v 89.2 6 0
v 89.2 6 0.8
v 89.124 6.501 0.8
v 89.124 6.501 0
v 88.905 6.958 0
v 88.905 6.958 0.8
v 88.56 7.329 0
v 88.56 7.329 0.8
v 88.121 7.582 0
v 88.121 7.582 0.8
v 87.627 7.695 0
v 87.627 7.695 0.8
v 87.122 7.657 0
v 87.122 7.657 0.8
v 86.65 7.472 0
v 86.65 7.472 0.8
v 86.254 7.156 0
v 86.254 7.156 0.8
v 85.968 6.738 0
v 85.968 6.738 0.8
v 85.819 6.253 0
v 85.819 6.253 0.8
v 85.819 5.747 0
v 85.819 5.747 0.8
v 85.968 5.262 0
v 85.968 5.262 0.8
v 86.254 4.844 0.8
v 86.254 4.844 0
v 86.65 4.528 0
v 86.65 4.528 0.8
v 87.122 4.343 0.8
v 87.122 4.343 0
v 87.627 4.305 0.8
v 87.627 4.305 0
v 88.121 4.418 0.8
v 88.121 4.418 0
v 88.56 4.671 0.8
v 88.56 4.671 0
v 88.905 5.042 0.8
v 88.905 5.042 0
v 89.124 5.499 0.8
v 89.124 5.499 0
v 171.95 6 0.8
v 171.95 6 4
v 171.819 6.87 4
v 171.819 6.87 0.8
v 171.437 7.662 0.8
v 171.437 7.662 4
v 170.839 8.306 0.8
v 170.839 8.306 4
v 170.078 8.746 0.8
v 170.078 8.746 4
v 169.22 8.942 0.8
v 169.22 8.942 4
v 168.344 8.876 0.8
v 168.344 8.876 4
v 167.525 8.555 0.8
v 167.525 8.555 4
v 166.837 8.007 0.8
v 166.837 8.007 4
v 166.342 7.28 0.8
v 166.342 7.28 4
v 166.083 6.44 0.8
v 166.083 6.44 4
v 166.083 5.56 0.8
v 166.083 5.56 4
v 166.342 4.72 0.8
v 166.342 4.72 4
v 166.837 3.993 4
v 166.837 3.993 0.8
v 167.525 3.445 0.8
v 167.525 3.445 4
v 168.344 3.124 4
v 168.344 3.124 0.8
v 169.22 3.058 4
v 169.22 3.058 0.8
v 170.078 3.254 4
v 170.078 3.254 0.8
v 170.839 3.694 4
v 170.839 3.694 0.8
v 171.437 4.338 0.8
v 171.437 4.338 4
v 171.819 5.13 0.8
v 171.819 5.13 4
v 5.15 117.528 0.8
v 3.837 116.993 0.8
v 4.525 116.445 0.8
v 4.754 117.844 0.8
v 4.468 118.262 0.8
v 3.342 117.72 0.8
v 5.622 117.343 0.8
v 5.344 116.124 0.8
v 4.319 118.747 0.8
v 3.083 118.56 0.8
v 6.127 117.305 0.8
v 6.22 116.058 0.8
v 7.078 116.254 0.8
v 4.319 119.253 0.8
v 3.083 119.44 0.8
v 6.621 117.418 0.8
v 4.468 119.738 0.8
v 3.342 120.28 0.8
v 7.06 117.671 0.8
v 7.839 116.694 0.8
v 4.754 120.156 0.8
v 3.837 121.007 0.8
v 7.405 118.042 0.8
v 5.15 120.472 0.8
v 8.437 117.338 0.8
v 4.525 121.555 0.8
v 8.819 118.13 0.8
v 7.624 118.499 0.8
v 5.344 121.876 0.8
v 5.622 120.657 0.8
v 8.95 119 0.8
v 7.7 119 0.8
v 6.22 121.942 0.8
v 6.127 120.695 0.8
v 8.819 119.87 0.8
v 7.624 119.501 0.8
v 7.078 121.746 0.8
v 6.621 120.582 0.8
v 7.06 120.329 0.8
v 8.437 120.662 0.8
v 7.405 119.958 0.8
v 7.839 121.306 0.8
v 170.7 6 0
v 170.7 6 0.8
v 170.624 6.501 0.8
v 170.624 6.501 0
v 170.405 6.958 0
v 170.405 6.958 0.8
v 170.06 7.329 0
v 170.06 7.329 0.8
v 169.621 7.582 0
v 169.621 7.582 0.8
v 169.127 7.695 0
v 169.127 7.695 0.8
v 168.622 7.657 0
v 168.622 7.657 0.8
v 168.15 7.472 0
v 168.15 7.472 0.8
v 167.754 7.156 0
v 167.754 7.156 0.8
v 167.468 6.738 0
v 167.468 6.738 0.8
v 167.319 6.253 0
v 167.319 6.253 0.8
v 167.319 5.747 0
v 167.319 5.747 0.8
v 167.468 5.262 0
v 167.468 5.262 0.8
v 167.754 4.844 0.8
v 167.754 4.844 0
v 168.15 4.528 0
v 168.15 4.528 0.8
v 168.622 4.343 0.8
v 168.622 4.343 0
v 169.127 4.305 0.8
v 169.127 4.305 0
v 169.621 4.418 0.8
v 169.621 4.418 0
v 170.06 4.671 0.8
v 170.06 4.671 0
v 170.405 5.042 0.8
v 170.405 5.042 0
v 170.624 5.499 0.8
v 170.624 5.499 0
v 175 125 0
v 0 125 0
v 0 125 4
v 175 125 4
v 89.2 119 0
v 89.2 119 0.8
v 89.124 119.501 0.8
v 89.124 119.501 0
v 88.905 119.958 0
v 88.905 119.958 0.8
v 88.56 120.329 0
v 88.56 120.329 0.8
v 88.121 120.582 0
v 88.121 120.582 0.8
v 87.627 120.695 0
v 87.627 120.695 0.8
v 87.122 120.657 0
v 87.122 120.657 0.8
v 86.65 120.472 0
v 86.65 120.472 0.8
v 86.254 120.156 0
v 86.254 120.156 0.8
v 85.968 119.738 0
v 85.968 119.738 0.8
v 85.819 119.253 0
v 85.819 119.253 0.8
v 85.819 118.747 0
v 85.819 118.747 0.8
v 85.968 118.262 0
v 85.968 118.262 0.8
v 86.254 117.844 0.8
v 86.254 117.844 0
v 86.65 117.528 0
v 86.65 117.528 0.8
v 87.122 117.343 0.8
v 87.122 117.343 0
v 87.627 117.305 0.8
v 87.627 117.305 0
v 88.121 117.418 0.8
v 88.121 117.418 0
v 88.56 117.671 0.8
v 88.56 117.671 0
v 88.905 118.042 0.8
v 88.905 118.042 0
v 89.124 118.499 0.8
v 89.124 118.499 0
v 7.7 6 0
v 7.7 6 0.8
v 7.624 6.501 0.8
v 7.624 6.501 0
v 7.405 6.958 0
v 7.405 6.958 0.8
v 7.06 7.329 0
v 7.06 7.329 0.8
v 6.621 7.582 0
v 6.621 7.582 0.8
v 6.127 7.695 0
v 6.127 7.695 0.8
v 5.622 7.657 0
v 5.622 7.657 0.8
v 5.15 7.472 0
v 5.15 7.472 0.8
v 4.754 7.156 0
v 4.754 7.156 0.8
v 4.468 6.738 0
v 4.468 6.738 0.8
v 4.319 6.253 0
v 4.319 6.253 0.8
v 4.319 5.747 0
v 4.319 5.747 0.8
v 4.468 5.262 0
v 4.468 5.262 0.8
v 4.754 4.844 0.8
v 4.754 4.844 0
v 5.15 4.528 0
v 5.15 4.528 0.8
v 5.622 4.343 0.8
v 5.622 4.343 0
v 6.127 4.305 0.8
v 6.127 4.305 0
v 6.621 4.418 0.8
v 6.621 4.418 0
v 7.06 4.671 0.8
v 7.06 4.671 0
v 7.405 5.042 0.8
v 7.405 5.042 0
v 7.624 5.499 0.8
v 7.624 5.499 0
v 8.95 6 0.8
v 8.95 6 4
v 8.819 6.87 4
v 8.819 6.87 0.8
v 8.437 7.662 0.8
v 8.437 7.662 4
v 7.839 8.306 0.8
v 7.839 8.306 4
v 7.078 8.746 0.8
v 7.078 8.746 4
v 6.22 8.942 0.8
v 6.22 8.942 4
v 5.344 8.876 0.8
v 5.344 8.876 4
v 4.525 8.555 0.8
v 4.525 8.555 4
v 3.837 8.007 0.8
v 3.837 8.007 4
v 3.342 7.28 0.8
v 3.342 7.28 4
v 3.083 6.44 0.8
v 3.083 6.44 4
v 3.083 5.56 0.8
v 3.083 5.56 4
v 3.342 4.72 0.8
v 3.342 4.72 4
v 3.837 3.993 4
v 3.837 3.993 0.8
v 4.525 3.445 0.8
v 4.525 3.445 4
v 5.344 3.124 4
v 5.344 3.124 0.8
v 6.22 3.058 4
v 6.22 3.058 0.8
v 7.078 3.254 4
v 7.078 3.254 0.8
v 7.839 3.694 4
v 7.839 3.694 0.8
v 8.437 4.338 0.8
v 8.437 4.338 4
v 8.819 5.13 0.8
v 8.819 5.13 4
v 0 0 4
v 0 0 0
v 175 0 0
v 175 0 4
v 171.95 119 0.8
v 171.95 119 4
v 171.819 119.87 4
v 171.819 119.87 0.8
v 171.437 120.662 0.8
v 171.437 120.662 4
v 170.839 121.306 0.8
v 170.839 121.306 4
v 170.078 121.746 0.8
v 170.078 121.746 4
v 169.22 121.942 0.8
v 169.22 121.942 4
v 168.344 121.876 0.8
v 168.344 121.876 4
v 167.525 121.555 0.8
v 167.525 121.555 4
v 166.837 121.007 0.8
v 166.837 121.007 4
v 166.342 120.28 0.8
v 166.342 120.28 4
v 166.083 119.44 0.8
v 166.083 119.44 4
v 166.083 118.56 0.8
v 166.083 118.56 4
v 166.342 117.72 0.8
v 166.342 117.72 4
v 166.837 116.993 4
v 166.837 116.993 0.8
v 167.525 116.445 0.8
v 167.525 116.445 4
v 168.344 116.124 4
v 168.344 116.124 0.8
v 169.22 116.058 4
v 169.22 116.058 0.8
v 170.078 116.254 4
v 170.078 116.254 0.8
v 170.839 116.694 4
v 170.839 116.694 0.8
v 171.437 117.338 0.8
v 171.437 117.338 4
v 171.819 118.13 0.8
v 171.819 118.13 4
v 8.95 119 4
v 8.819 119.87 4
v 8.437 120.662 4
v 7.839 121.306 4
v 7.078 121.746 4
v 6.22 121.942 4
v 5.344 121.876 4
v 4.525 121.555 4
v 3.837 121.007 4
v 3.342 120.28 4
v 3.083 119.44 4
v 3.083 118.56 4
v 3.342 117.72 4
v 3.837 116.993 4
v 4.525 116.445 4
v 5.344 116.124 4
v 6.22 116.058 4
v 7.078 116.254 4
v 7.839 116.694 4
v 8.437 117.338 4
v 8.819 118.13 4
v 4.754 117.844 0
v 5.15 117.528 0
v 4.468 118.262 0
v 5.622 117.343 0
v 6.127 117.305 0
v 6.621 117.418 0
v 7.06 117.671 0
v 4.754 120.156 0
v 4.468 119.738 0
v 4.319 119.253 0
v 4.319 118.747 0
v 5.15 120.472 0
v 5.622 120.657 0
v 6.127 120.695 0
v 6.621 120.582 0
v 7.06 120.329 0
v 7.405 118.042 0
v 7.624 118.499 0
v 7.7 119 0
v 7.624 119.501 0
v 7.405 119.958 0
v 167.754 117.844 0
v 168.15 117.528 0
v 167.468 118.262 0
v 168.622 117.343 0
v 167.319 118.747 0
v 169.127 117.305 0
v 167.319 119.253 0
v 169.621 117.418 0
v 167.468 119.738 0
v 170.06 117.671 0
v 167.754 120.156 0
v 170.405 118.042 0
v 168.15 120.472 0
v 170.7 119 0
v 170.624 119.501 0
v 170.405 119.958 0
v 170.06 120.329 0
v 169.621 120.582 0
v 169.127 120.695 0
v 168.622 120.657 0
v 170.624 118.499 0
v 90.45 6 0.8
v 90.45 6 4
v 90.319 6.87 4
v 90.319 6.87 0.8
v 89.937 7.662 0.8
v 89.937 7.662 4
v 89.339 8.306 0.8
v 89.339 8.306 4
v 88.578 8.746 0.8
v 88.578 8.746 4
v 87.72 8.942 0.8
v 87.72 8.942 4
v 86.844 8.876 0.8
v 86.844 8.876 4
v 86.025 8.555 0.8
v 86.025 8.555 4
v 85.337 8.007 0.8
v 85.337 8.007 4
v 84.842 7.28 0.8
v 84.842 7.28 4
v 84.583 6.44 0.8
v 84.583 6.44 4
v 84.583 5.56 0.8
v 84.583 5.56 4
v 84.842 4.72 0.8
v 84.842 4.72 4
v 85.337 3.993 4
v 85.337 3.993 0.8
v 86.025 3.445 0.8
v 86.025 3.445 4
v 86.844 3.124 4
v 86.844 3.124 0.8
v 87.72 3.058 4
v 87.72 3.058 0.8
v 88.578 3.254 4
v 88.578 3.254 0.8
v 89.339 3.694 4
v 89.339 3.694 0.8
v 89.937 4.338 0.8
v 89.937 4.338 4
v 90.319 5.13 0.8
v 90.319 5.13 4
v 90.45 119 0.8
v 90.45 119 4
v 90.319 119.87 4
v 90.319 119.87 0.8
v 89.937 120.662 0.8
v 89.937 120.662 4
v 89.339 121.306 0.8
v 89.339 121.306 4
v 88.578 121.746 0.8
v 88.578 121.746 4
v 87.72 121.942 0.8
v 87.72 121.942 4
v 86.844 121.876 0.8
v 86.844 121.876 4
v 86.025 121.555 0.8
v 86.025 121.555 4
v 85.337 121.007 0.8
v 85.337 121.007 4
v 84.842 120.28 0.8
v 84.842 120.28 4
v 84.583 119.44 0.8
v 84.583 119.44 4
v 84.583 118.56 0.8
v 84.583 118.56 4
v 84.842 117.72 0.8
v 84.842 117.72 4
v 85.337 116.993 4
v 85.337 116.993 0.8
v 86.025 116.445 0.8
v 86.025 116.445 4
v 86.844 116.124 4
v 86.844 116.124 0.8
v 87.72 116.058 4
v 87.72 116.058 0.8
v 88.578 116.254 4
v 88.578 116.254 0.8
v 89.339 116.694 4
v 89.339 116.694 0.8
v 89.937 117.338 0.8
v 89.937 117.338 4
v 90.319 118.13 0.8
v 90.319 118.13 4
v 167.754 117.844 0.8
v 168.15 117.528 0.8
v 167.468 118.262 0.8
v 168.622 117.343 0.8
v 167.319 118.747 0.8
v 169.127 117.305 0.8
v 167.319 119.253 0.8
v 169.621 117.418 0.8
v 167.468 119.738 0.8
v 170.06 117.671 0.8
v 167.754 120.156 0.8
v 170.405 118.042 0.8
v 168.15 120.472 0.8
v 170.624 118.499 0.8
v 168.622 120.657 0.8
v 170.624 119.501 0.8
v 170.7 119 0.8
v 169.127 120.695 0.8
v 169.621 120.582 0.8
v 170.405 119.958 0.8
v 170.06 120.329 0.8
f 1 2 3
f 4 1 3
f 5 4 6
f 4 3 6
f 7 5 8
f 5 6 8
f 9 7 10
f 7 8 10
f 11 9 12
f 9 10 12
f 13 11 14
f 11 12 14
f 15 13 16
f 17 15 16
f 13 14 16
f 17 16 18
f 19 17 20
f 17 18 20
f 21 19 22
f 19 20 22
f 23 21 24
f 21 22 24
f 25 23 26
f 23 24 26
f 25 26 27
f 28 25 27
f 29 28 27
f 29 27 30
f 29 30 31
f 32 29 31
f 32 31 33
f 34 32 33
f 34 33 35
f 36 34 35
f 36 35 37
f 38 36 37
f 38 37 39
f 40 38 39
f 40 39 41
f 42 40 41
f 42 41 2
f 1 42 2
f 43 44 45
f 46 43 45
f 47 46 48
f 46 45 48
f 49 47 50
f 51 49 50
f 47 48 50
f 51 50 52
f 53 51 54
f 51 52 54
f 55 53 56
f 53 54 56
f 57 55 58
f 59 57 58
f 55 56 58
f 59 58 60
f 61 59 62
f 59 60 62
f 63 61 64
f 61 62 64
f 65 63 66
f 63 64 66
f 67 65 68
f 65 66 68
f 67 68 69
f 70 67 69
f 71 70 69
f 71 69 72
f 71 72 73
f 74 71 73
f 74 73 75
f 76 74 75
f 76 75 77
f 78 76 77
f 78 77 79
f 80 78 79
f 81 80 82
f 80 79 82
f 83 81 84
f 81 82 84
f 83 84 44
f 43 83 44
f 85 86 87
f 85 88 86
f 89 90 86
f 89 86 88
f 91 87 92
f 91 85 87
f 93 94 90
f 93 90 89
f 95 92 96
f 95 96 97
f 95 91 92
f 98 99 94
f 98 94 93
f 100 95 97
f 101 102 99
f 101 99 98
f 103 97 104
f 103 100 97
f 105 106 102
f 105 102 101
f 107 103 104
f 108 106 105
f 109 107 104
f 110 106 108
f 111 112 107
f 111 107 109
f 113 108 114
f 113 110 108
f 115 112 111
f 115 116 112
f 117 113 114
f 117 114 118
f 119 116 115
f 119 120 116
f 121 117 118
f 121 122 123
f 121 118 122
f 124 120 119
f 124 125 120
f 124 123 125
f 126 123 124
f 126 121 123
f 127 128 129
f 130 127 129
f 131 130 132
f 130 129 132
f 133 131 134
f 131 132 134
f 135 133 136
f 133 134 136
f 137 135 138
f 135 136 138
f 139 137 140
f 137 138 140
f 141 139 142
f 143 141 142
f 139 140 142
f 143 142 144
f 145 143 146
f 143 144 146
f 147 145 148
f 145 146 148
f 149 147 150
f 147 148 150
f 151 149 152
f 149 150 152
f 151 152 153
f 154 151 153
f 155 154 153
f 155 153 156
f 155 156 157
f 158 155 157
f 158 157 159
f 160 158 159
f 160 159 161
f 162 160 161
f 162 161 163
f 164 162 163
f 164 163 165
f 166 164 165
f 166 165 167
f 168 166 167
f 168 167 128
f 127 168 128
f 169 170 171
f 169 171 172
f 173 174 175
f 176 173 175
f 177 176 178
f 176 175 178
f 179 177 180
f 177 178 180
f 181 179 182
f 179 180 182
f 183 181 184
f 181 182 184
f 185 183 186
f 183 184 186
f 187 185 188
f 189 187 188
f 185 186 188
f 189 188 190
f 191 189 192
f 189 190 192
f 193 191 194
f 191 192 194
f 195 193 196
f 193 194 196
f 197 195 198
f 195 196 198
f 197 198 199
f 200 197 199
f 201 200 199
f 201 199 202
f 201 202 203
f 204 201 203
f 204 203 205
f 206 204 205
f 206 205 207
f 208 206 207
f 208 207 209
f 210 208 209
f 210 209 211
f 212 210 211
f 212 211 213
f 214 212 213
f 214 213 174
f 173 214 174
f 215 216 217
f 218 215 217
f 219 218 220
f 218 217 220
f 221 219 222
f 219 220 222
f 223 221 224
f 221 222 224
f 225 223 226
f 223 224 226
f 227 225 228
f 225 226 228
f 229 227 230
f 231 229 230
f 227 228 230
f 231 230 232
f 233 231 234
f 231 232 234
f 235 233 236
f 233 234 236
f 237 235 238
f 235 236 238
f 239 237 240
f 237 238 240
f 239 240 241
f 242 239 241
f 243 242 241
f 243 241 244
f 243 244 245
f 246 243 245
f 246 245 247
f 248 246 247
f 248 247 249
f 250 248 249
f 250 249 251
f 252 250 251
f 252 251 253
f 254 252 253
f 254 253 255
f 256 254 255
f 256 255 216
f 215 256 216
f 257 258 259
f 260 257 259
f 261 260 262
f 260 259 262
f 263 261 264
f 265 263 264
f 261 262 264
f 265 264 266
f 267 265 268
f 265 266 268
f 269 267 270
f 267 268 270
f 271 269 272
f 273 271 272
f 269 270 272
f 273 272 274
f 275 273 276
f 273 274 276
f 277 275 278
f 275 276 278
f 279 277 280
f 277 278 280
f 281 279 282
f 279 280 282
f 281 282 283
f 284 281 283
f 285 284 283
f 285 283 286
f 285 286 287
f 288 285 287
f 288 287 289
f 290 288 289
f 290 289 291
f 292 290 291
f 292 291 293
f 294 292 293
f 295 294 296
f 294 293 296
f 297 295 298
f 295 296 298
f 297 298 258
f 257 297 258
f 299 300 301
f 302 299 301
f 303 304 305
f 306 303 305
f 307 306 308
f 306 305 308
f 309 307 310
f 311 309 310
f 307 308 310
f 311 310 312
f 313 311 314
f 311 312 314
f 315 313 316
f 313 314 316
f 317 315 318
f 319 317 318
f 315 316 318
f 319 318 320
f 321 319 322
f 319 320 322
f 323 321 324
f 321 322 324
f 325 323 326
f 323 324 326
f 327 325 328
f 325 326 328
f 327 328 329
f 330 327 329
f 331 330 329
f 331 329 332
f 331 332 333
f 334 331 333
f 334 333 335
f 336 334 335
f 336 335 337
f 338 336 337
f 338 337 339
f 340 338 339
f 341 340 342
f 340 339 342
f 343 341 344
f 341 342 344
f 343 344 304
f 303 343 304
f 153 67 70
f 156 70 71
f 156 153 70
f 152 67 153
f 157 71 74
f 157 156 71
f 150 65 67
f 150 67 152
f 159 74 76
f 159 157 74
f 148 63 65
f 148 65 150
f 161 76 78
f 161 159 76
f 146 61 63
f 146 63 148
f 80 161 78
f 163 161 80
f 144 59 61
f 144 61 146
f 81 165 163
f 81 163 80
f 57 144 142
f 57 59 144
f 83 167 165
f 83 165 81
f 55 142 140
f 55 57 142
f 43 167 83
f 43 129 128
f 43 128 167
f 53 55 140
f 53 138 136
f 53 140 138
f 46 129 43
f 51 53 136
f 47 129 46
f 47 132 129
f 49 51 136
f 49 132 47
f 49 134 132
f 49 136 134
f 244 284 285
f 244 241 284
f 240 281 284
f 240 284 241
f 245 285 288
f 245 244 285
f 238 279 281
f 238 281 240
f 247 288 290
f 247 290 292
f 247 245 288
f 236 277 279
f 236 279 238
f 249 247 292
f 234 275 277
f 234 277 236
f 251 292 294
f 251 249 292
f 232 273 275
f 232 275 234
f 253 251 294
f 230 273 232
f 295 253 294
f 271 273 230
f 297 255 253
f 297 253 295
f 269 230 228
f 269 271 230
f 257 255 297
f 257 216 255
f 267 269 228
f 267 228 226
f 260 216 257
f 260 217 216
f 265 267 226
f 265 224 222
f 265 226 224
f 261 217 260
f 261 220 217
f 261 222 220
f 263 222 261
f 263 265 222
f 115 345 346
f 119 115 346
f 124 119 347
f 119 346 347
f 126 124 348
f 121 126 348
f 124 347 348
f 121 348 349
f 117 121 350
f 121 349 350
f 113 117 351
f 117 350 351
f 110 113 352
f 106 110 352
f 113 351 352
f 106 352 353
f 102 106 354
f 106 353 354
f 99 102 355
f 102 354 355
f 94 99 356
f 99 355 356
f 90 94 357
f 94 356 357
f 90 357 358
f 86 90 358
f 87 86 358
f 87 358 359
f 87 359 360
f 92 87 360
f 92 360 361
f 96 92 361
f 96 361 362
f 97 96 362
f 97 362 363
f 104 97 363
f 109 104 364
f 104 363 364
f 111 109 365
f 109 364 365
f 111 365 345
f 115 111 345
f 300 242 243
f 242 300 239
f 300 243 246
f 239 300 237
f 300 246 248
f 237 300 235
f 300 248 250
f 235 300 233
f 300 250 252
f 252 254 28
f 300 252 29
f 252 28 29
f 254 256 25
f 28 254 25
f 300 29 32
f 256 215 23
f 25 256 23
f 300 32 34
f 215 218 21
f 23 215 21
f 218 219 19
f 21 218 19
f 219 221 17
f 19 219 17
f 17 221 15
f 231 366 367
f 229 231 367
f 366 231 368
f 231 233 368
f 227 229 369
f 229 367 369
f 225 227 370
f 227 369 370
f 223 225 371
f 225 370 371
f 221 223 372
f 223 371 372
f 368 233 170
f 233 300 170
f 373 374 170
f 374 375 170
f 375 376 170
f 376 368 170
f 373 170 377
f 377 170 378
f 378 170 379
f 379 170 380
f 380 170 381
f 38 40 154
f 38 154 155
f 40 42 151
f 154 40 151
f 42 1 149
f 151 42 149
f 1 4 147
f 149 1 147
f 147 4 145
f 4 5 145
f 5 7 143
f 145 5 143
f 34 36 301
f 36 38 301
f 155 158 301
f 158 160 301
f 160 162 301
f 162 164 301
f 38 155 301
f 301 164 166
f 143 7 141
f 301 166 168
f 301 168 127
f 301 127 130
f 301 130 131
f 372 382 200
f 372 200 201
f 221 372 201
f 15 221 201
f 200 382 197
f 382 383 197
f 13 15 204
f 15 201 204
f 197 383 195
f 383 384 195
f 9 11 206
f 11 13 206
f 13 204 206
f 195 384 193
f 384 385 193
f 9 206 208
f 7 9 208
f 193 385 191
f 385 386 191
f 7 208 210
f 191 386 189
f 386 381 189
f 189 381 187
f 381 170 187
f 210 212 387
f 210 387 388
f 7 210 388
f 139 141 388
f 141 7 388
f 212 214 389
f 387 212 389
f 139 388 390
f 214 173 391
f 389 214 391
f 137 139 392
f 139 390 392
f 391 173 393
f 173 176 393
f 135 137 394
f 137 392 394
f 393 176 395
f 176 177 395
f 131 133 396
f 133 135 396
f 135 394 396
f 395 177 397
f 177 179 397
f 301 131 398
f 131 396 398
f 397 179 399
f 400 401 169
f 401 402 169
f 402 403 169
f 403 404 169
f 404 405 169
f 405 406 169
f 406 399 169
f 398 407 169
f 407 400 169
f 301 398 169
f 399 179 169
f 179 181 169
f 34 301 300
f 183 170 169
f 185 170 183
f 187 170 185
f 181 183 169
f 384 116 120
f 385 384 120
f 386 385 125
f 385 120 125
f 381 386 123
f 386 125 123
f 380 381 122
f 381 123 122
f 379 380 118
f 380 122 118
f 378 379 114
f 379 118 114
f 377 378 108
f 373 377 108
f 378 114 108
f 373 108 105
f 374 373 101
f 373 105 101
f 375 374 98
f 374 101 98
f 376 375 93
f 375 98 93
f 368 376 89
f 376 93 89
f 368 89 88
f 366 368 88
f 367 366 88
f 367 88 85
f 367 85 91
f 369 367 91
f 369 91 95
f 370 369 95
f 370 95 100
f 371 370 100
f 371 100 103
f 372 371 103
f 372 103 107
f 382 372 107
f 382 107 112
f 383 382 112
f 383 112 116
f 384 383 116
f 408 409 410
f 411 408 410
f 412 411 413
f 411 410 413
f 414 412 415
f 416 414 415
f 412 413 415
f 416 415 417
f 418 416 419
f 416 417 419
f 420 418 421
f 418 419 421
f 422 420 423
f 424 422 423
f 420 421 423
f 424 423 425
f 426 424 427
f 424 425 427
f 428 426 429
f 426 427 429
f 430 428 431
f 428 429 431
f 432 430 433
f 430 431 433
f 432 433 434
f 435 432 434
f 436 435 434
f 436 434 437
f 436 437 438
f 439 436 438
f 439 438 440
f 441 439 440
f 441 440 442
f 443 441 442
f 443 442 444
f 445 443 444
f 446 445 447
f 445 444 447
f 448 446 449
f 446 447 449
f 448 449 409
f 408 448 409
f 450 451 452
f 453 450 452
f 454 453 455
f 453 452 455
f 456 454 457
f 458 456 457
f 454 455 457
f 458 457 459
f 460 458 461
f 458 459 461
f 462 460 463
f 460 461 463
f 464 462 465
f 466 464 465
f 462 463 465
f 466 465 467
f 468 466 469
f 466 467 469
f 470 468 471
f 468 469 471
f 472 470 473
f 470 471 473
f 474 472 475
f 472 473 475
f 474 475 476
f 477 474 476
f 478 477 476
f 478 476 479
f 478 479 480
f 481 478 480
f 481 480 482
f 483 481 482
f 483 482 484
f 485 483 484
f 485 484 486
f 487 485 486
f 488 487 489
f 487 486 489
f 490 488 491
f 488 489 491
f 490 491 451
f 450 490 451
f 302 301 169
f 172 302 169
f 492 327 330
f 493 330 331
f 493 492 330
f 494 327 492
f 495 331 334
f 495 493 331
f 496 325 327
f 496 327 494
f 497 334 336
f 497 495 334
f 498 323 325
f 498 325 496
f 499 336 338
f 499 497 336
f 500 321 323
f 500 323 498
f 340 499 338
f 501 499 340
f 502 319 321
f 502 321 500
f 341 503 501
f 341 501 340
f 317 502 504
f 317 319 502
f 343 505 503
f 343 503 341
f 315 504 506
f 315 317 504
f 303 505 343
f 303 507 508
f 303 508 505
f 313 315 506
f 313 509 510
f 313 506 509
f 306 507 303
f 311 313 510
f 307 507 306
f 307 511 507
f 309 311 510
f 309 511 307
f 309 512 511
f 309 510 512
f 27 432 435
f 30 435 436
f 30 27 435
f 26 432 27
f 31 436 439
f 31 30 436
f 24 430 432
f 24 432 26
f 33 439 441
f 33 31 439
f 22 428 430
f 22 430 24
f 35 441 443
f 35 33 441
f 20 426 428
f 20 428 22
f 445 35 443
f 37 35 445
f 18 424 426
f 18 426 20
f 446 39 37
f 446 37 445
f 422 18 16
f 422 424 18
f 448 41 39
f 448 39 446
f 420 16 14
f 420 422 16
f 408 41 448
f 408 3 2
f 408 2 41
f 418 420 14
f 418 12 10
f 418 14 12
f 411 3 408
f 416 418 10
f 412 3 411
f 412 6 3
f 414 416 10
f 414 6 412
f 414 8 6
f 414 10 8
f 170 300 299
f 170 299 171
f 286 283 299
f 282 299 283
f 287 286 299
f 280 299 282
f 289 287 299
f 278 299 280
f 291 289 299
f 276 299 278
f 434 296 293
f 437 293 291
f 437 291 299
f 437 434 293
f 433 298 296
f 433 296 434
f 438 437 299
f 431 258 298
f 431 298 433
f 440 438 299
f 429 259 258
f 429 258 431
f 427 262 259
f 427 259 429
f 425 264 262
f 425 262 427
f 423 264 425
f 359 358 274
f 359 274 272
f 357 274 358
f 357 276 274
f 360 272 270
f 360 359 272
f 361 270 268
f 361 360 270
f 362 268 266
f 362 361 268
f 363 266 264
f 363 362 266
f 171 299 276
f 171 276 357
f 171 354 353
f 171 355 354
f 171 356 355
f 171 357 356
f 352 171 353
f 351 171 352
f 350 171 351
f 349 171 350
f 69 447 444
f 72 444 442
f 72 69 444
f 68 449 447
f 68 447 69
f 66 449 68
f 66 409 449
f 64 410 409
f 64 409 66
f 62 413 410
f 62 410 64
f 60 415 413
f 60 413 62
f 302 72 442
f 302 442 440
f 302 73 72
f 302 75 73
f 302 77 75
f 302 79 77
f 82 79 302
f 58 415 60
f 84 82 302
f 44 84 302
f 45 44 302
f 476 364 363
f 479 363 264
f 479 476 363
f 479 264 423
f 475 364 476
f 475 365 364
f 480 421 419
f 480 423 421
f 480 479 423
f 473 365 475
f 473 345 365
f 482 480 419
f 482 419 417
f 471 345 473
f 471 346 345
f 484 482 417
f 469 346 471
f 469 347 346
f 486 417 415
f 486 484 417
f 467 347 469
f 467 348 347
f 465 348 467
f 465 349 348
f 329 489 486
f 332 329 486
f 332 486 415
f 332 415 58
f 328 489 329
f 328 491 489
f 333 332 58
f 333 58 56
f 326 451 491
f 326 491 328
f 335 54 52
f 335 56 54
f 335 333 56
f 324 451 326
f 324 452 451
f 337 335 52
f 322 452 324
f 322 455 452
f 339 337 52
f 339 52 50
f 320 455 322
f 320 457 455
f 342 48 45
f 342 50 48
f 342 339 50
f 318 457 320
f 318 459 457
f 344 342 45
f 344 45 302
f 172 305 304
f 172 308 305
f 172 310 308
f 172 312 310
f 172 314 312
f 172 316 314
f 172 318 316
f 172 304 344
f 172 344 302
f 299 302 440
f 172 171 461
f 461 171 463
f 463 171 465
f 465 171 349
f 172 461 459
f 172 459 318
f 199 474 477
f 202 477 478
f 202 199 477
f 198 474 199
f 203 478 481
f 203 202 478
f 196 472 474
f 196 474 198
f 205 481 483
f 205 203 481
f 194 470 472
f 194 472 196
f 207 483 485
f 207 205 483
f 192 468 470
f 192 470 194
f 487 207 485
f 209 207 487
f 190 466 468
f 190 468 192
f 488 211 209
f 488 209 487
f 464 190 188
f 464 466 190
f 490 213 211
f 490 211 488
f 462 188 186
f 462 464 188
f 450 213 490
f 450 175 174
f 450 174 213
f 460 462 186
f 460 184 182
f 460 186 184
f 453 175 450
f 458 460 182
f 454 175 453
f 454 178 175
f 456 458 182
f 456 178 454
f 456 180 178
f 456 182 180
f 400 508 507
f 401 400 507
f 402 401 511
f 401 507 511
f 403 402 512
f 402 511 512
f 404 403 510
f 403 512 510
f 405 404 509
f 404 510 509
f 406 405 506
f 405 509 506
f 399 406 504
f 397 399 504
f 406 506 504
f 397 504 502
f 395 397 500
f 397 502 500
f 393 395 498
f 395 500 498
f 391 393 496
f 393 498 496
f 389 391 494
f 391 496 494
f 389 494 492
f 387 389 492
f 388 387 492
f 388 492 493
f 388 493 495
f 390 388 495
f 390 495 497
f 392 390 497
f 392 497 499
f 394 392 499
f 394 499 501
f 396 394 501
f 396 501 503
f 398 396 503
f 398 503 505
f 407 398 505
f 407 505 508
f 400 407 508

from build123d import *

# Parameters (mm, degrees)
SKETCH1_W           = 175
SKETCH1_H           = 125
BOSS_EXTRUDE1_DEPTH = 4
SKETCH2_R           = 2.95
CUT_EXTRUDE1_DEPTH  = 3.2
SKETCH3_R           = 1.7
CUT_EXTRUDE2_DEPTH  = 3.2


with BuildPart() as part:
    # Sketch1 → Boss-Extrude1 (new body)
    with BuildSketch(Plane.XY):
        with Locations((87.5, 62.5)):
            Rectangle(SKETCH1_W, SKETCH1_H)
    extrude(amount=BOSS_EXTRUDE1_DEPTH)

    # Sketch2 → Cut-Extrude1 (cut)
    with BuildSketch(Plane.XY.offset(4)):
        with Locations((6, 119)):
            Circle(SKETCH2_R)
        with Locations((169, 119)):
            Circle(SKETCH2_R)
        with Locations((6, 6)):
            Circle(SKETCH2_R)
        with Locations((169, 6)):
            Circle(SKETCH2_R)
        with Locations((87.5, 119)):
            Circle(SKETCH2_R)
        with Locations((87.5, 6)):
            Circle(SKETCH2_R)
    extrude(amount=-CUT_EXTRUDE1_DEPTH, mode=Mode.SUBTRACT)

    # Sketch3 → Cut-Extrude2 (cut)
    with BuildSketch(Plane.XY.offset(0.8)):
        with Locations((6, 119)):
            Circle(SKETCH3_R)
        with Locations((87.5, 119)):
            Circle(SKETCH3_R)
        with Locations((169, 119)):
            Circle(SKETCH3_R)
        with Locations((169, 6)):
            Circle(SKETCH3_R)
        with Locations((87.5, 6)):
            Circle(SKETCH3_R)
        with Locations((6, 6)):
            Circle(SKETCH3_R)
    extrude(amount=-CUT_EXTRUDE2_DEPTH, mode=Mode.SUBTRACT)


solid = part.part
